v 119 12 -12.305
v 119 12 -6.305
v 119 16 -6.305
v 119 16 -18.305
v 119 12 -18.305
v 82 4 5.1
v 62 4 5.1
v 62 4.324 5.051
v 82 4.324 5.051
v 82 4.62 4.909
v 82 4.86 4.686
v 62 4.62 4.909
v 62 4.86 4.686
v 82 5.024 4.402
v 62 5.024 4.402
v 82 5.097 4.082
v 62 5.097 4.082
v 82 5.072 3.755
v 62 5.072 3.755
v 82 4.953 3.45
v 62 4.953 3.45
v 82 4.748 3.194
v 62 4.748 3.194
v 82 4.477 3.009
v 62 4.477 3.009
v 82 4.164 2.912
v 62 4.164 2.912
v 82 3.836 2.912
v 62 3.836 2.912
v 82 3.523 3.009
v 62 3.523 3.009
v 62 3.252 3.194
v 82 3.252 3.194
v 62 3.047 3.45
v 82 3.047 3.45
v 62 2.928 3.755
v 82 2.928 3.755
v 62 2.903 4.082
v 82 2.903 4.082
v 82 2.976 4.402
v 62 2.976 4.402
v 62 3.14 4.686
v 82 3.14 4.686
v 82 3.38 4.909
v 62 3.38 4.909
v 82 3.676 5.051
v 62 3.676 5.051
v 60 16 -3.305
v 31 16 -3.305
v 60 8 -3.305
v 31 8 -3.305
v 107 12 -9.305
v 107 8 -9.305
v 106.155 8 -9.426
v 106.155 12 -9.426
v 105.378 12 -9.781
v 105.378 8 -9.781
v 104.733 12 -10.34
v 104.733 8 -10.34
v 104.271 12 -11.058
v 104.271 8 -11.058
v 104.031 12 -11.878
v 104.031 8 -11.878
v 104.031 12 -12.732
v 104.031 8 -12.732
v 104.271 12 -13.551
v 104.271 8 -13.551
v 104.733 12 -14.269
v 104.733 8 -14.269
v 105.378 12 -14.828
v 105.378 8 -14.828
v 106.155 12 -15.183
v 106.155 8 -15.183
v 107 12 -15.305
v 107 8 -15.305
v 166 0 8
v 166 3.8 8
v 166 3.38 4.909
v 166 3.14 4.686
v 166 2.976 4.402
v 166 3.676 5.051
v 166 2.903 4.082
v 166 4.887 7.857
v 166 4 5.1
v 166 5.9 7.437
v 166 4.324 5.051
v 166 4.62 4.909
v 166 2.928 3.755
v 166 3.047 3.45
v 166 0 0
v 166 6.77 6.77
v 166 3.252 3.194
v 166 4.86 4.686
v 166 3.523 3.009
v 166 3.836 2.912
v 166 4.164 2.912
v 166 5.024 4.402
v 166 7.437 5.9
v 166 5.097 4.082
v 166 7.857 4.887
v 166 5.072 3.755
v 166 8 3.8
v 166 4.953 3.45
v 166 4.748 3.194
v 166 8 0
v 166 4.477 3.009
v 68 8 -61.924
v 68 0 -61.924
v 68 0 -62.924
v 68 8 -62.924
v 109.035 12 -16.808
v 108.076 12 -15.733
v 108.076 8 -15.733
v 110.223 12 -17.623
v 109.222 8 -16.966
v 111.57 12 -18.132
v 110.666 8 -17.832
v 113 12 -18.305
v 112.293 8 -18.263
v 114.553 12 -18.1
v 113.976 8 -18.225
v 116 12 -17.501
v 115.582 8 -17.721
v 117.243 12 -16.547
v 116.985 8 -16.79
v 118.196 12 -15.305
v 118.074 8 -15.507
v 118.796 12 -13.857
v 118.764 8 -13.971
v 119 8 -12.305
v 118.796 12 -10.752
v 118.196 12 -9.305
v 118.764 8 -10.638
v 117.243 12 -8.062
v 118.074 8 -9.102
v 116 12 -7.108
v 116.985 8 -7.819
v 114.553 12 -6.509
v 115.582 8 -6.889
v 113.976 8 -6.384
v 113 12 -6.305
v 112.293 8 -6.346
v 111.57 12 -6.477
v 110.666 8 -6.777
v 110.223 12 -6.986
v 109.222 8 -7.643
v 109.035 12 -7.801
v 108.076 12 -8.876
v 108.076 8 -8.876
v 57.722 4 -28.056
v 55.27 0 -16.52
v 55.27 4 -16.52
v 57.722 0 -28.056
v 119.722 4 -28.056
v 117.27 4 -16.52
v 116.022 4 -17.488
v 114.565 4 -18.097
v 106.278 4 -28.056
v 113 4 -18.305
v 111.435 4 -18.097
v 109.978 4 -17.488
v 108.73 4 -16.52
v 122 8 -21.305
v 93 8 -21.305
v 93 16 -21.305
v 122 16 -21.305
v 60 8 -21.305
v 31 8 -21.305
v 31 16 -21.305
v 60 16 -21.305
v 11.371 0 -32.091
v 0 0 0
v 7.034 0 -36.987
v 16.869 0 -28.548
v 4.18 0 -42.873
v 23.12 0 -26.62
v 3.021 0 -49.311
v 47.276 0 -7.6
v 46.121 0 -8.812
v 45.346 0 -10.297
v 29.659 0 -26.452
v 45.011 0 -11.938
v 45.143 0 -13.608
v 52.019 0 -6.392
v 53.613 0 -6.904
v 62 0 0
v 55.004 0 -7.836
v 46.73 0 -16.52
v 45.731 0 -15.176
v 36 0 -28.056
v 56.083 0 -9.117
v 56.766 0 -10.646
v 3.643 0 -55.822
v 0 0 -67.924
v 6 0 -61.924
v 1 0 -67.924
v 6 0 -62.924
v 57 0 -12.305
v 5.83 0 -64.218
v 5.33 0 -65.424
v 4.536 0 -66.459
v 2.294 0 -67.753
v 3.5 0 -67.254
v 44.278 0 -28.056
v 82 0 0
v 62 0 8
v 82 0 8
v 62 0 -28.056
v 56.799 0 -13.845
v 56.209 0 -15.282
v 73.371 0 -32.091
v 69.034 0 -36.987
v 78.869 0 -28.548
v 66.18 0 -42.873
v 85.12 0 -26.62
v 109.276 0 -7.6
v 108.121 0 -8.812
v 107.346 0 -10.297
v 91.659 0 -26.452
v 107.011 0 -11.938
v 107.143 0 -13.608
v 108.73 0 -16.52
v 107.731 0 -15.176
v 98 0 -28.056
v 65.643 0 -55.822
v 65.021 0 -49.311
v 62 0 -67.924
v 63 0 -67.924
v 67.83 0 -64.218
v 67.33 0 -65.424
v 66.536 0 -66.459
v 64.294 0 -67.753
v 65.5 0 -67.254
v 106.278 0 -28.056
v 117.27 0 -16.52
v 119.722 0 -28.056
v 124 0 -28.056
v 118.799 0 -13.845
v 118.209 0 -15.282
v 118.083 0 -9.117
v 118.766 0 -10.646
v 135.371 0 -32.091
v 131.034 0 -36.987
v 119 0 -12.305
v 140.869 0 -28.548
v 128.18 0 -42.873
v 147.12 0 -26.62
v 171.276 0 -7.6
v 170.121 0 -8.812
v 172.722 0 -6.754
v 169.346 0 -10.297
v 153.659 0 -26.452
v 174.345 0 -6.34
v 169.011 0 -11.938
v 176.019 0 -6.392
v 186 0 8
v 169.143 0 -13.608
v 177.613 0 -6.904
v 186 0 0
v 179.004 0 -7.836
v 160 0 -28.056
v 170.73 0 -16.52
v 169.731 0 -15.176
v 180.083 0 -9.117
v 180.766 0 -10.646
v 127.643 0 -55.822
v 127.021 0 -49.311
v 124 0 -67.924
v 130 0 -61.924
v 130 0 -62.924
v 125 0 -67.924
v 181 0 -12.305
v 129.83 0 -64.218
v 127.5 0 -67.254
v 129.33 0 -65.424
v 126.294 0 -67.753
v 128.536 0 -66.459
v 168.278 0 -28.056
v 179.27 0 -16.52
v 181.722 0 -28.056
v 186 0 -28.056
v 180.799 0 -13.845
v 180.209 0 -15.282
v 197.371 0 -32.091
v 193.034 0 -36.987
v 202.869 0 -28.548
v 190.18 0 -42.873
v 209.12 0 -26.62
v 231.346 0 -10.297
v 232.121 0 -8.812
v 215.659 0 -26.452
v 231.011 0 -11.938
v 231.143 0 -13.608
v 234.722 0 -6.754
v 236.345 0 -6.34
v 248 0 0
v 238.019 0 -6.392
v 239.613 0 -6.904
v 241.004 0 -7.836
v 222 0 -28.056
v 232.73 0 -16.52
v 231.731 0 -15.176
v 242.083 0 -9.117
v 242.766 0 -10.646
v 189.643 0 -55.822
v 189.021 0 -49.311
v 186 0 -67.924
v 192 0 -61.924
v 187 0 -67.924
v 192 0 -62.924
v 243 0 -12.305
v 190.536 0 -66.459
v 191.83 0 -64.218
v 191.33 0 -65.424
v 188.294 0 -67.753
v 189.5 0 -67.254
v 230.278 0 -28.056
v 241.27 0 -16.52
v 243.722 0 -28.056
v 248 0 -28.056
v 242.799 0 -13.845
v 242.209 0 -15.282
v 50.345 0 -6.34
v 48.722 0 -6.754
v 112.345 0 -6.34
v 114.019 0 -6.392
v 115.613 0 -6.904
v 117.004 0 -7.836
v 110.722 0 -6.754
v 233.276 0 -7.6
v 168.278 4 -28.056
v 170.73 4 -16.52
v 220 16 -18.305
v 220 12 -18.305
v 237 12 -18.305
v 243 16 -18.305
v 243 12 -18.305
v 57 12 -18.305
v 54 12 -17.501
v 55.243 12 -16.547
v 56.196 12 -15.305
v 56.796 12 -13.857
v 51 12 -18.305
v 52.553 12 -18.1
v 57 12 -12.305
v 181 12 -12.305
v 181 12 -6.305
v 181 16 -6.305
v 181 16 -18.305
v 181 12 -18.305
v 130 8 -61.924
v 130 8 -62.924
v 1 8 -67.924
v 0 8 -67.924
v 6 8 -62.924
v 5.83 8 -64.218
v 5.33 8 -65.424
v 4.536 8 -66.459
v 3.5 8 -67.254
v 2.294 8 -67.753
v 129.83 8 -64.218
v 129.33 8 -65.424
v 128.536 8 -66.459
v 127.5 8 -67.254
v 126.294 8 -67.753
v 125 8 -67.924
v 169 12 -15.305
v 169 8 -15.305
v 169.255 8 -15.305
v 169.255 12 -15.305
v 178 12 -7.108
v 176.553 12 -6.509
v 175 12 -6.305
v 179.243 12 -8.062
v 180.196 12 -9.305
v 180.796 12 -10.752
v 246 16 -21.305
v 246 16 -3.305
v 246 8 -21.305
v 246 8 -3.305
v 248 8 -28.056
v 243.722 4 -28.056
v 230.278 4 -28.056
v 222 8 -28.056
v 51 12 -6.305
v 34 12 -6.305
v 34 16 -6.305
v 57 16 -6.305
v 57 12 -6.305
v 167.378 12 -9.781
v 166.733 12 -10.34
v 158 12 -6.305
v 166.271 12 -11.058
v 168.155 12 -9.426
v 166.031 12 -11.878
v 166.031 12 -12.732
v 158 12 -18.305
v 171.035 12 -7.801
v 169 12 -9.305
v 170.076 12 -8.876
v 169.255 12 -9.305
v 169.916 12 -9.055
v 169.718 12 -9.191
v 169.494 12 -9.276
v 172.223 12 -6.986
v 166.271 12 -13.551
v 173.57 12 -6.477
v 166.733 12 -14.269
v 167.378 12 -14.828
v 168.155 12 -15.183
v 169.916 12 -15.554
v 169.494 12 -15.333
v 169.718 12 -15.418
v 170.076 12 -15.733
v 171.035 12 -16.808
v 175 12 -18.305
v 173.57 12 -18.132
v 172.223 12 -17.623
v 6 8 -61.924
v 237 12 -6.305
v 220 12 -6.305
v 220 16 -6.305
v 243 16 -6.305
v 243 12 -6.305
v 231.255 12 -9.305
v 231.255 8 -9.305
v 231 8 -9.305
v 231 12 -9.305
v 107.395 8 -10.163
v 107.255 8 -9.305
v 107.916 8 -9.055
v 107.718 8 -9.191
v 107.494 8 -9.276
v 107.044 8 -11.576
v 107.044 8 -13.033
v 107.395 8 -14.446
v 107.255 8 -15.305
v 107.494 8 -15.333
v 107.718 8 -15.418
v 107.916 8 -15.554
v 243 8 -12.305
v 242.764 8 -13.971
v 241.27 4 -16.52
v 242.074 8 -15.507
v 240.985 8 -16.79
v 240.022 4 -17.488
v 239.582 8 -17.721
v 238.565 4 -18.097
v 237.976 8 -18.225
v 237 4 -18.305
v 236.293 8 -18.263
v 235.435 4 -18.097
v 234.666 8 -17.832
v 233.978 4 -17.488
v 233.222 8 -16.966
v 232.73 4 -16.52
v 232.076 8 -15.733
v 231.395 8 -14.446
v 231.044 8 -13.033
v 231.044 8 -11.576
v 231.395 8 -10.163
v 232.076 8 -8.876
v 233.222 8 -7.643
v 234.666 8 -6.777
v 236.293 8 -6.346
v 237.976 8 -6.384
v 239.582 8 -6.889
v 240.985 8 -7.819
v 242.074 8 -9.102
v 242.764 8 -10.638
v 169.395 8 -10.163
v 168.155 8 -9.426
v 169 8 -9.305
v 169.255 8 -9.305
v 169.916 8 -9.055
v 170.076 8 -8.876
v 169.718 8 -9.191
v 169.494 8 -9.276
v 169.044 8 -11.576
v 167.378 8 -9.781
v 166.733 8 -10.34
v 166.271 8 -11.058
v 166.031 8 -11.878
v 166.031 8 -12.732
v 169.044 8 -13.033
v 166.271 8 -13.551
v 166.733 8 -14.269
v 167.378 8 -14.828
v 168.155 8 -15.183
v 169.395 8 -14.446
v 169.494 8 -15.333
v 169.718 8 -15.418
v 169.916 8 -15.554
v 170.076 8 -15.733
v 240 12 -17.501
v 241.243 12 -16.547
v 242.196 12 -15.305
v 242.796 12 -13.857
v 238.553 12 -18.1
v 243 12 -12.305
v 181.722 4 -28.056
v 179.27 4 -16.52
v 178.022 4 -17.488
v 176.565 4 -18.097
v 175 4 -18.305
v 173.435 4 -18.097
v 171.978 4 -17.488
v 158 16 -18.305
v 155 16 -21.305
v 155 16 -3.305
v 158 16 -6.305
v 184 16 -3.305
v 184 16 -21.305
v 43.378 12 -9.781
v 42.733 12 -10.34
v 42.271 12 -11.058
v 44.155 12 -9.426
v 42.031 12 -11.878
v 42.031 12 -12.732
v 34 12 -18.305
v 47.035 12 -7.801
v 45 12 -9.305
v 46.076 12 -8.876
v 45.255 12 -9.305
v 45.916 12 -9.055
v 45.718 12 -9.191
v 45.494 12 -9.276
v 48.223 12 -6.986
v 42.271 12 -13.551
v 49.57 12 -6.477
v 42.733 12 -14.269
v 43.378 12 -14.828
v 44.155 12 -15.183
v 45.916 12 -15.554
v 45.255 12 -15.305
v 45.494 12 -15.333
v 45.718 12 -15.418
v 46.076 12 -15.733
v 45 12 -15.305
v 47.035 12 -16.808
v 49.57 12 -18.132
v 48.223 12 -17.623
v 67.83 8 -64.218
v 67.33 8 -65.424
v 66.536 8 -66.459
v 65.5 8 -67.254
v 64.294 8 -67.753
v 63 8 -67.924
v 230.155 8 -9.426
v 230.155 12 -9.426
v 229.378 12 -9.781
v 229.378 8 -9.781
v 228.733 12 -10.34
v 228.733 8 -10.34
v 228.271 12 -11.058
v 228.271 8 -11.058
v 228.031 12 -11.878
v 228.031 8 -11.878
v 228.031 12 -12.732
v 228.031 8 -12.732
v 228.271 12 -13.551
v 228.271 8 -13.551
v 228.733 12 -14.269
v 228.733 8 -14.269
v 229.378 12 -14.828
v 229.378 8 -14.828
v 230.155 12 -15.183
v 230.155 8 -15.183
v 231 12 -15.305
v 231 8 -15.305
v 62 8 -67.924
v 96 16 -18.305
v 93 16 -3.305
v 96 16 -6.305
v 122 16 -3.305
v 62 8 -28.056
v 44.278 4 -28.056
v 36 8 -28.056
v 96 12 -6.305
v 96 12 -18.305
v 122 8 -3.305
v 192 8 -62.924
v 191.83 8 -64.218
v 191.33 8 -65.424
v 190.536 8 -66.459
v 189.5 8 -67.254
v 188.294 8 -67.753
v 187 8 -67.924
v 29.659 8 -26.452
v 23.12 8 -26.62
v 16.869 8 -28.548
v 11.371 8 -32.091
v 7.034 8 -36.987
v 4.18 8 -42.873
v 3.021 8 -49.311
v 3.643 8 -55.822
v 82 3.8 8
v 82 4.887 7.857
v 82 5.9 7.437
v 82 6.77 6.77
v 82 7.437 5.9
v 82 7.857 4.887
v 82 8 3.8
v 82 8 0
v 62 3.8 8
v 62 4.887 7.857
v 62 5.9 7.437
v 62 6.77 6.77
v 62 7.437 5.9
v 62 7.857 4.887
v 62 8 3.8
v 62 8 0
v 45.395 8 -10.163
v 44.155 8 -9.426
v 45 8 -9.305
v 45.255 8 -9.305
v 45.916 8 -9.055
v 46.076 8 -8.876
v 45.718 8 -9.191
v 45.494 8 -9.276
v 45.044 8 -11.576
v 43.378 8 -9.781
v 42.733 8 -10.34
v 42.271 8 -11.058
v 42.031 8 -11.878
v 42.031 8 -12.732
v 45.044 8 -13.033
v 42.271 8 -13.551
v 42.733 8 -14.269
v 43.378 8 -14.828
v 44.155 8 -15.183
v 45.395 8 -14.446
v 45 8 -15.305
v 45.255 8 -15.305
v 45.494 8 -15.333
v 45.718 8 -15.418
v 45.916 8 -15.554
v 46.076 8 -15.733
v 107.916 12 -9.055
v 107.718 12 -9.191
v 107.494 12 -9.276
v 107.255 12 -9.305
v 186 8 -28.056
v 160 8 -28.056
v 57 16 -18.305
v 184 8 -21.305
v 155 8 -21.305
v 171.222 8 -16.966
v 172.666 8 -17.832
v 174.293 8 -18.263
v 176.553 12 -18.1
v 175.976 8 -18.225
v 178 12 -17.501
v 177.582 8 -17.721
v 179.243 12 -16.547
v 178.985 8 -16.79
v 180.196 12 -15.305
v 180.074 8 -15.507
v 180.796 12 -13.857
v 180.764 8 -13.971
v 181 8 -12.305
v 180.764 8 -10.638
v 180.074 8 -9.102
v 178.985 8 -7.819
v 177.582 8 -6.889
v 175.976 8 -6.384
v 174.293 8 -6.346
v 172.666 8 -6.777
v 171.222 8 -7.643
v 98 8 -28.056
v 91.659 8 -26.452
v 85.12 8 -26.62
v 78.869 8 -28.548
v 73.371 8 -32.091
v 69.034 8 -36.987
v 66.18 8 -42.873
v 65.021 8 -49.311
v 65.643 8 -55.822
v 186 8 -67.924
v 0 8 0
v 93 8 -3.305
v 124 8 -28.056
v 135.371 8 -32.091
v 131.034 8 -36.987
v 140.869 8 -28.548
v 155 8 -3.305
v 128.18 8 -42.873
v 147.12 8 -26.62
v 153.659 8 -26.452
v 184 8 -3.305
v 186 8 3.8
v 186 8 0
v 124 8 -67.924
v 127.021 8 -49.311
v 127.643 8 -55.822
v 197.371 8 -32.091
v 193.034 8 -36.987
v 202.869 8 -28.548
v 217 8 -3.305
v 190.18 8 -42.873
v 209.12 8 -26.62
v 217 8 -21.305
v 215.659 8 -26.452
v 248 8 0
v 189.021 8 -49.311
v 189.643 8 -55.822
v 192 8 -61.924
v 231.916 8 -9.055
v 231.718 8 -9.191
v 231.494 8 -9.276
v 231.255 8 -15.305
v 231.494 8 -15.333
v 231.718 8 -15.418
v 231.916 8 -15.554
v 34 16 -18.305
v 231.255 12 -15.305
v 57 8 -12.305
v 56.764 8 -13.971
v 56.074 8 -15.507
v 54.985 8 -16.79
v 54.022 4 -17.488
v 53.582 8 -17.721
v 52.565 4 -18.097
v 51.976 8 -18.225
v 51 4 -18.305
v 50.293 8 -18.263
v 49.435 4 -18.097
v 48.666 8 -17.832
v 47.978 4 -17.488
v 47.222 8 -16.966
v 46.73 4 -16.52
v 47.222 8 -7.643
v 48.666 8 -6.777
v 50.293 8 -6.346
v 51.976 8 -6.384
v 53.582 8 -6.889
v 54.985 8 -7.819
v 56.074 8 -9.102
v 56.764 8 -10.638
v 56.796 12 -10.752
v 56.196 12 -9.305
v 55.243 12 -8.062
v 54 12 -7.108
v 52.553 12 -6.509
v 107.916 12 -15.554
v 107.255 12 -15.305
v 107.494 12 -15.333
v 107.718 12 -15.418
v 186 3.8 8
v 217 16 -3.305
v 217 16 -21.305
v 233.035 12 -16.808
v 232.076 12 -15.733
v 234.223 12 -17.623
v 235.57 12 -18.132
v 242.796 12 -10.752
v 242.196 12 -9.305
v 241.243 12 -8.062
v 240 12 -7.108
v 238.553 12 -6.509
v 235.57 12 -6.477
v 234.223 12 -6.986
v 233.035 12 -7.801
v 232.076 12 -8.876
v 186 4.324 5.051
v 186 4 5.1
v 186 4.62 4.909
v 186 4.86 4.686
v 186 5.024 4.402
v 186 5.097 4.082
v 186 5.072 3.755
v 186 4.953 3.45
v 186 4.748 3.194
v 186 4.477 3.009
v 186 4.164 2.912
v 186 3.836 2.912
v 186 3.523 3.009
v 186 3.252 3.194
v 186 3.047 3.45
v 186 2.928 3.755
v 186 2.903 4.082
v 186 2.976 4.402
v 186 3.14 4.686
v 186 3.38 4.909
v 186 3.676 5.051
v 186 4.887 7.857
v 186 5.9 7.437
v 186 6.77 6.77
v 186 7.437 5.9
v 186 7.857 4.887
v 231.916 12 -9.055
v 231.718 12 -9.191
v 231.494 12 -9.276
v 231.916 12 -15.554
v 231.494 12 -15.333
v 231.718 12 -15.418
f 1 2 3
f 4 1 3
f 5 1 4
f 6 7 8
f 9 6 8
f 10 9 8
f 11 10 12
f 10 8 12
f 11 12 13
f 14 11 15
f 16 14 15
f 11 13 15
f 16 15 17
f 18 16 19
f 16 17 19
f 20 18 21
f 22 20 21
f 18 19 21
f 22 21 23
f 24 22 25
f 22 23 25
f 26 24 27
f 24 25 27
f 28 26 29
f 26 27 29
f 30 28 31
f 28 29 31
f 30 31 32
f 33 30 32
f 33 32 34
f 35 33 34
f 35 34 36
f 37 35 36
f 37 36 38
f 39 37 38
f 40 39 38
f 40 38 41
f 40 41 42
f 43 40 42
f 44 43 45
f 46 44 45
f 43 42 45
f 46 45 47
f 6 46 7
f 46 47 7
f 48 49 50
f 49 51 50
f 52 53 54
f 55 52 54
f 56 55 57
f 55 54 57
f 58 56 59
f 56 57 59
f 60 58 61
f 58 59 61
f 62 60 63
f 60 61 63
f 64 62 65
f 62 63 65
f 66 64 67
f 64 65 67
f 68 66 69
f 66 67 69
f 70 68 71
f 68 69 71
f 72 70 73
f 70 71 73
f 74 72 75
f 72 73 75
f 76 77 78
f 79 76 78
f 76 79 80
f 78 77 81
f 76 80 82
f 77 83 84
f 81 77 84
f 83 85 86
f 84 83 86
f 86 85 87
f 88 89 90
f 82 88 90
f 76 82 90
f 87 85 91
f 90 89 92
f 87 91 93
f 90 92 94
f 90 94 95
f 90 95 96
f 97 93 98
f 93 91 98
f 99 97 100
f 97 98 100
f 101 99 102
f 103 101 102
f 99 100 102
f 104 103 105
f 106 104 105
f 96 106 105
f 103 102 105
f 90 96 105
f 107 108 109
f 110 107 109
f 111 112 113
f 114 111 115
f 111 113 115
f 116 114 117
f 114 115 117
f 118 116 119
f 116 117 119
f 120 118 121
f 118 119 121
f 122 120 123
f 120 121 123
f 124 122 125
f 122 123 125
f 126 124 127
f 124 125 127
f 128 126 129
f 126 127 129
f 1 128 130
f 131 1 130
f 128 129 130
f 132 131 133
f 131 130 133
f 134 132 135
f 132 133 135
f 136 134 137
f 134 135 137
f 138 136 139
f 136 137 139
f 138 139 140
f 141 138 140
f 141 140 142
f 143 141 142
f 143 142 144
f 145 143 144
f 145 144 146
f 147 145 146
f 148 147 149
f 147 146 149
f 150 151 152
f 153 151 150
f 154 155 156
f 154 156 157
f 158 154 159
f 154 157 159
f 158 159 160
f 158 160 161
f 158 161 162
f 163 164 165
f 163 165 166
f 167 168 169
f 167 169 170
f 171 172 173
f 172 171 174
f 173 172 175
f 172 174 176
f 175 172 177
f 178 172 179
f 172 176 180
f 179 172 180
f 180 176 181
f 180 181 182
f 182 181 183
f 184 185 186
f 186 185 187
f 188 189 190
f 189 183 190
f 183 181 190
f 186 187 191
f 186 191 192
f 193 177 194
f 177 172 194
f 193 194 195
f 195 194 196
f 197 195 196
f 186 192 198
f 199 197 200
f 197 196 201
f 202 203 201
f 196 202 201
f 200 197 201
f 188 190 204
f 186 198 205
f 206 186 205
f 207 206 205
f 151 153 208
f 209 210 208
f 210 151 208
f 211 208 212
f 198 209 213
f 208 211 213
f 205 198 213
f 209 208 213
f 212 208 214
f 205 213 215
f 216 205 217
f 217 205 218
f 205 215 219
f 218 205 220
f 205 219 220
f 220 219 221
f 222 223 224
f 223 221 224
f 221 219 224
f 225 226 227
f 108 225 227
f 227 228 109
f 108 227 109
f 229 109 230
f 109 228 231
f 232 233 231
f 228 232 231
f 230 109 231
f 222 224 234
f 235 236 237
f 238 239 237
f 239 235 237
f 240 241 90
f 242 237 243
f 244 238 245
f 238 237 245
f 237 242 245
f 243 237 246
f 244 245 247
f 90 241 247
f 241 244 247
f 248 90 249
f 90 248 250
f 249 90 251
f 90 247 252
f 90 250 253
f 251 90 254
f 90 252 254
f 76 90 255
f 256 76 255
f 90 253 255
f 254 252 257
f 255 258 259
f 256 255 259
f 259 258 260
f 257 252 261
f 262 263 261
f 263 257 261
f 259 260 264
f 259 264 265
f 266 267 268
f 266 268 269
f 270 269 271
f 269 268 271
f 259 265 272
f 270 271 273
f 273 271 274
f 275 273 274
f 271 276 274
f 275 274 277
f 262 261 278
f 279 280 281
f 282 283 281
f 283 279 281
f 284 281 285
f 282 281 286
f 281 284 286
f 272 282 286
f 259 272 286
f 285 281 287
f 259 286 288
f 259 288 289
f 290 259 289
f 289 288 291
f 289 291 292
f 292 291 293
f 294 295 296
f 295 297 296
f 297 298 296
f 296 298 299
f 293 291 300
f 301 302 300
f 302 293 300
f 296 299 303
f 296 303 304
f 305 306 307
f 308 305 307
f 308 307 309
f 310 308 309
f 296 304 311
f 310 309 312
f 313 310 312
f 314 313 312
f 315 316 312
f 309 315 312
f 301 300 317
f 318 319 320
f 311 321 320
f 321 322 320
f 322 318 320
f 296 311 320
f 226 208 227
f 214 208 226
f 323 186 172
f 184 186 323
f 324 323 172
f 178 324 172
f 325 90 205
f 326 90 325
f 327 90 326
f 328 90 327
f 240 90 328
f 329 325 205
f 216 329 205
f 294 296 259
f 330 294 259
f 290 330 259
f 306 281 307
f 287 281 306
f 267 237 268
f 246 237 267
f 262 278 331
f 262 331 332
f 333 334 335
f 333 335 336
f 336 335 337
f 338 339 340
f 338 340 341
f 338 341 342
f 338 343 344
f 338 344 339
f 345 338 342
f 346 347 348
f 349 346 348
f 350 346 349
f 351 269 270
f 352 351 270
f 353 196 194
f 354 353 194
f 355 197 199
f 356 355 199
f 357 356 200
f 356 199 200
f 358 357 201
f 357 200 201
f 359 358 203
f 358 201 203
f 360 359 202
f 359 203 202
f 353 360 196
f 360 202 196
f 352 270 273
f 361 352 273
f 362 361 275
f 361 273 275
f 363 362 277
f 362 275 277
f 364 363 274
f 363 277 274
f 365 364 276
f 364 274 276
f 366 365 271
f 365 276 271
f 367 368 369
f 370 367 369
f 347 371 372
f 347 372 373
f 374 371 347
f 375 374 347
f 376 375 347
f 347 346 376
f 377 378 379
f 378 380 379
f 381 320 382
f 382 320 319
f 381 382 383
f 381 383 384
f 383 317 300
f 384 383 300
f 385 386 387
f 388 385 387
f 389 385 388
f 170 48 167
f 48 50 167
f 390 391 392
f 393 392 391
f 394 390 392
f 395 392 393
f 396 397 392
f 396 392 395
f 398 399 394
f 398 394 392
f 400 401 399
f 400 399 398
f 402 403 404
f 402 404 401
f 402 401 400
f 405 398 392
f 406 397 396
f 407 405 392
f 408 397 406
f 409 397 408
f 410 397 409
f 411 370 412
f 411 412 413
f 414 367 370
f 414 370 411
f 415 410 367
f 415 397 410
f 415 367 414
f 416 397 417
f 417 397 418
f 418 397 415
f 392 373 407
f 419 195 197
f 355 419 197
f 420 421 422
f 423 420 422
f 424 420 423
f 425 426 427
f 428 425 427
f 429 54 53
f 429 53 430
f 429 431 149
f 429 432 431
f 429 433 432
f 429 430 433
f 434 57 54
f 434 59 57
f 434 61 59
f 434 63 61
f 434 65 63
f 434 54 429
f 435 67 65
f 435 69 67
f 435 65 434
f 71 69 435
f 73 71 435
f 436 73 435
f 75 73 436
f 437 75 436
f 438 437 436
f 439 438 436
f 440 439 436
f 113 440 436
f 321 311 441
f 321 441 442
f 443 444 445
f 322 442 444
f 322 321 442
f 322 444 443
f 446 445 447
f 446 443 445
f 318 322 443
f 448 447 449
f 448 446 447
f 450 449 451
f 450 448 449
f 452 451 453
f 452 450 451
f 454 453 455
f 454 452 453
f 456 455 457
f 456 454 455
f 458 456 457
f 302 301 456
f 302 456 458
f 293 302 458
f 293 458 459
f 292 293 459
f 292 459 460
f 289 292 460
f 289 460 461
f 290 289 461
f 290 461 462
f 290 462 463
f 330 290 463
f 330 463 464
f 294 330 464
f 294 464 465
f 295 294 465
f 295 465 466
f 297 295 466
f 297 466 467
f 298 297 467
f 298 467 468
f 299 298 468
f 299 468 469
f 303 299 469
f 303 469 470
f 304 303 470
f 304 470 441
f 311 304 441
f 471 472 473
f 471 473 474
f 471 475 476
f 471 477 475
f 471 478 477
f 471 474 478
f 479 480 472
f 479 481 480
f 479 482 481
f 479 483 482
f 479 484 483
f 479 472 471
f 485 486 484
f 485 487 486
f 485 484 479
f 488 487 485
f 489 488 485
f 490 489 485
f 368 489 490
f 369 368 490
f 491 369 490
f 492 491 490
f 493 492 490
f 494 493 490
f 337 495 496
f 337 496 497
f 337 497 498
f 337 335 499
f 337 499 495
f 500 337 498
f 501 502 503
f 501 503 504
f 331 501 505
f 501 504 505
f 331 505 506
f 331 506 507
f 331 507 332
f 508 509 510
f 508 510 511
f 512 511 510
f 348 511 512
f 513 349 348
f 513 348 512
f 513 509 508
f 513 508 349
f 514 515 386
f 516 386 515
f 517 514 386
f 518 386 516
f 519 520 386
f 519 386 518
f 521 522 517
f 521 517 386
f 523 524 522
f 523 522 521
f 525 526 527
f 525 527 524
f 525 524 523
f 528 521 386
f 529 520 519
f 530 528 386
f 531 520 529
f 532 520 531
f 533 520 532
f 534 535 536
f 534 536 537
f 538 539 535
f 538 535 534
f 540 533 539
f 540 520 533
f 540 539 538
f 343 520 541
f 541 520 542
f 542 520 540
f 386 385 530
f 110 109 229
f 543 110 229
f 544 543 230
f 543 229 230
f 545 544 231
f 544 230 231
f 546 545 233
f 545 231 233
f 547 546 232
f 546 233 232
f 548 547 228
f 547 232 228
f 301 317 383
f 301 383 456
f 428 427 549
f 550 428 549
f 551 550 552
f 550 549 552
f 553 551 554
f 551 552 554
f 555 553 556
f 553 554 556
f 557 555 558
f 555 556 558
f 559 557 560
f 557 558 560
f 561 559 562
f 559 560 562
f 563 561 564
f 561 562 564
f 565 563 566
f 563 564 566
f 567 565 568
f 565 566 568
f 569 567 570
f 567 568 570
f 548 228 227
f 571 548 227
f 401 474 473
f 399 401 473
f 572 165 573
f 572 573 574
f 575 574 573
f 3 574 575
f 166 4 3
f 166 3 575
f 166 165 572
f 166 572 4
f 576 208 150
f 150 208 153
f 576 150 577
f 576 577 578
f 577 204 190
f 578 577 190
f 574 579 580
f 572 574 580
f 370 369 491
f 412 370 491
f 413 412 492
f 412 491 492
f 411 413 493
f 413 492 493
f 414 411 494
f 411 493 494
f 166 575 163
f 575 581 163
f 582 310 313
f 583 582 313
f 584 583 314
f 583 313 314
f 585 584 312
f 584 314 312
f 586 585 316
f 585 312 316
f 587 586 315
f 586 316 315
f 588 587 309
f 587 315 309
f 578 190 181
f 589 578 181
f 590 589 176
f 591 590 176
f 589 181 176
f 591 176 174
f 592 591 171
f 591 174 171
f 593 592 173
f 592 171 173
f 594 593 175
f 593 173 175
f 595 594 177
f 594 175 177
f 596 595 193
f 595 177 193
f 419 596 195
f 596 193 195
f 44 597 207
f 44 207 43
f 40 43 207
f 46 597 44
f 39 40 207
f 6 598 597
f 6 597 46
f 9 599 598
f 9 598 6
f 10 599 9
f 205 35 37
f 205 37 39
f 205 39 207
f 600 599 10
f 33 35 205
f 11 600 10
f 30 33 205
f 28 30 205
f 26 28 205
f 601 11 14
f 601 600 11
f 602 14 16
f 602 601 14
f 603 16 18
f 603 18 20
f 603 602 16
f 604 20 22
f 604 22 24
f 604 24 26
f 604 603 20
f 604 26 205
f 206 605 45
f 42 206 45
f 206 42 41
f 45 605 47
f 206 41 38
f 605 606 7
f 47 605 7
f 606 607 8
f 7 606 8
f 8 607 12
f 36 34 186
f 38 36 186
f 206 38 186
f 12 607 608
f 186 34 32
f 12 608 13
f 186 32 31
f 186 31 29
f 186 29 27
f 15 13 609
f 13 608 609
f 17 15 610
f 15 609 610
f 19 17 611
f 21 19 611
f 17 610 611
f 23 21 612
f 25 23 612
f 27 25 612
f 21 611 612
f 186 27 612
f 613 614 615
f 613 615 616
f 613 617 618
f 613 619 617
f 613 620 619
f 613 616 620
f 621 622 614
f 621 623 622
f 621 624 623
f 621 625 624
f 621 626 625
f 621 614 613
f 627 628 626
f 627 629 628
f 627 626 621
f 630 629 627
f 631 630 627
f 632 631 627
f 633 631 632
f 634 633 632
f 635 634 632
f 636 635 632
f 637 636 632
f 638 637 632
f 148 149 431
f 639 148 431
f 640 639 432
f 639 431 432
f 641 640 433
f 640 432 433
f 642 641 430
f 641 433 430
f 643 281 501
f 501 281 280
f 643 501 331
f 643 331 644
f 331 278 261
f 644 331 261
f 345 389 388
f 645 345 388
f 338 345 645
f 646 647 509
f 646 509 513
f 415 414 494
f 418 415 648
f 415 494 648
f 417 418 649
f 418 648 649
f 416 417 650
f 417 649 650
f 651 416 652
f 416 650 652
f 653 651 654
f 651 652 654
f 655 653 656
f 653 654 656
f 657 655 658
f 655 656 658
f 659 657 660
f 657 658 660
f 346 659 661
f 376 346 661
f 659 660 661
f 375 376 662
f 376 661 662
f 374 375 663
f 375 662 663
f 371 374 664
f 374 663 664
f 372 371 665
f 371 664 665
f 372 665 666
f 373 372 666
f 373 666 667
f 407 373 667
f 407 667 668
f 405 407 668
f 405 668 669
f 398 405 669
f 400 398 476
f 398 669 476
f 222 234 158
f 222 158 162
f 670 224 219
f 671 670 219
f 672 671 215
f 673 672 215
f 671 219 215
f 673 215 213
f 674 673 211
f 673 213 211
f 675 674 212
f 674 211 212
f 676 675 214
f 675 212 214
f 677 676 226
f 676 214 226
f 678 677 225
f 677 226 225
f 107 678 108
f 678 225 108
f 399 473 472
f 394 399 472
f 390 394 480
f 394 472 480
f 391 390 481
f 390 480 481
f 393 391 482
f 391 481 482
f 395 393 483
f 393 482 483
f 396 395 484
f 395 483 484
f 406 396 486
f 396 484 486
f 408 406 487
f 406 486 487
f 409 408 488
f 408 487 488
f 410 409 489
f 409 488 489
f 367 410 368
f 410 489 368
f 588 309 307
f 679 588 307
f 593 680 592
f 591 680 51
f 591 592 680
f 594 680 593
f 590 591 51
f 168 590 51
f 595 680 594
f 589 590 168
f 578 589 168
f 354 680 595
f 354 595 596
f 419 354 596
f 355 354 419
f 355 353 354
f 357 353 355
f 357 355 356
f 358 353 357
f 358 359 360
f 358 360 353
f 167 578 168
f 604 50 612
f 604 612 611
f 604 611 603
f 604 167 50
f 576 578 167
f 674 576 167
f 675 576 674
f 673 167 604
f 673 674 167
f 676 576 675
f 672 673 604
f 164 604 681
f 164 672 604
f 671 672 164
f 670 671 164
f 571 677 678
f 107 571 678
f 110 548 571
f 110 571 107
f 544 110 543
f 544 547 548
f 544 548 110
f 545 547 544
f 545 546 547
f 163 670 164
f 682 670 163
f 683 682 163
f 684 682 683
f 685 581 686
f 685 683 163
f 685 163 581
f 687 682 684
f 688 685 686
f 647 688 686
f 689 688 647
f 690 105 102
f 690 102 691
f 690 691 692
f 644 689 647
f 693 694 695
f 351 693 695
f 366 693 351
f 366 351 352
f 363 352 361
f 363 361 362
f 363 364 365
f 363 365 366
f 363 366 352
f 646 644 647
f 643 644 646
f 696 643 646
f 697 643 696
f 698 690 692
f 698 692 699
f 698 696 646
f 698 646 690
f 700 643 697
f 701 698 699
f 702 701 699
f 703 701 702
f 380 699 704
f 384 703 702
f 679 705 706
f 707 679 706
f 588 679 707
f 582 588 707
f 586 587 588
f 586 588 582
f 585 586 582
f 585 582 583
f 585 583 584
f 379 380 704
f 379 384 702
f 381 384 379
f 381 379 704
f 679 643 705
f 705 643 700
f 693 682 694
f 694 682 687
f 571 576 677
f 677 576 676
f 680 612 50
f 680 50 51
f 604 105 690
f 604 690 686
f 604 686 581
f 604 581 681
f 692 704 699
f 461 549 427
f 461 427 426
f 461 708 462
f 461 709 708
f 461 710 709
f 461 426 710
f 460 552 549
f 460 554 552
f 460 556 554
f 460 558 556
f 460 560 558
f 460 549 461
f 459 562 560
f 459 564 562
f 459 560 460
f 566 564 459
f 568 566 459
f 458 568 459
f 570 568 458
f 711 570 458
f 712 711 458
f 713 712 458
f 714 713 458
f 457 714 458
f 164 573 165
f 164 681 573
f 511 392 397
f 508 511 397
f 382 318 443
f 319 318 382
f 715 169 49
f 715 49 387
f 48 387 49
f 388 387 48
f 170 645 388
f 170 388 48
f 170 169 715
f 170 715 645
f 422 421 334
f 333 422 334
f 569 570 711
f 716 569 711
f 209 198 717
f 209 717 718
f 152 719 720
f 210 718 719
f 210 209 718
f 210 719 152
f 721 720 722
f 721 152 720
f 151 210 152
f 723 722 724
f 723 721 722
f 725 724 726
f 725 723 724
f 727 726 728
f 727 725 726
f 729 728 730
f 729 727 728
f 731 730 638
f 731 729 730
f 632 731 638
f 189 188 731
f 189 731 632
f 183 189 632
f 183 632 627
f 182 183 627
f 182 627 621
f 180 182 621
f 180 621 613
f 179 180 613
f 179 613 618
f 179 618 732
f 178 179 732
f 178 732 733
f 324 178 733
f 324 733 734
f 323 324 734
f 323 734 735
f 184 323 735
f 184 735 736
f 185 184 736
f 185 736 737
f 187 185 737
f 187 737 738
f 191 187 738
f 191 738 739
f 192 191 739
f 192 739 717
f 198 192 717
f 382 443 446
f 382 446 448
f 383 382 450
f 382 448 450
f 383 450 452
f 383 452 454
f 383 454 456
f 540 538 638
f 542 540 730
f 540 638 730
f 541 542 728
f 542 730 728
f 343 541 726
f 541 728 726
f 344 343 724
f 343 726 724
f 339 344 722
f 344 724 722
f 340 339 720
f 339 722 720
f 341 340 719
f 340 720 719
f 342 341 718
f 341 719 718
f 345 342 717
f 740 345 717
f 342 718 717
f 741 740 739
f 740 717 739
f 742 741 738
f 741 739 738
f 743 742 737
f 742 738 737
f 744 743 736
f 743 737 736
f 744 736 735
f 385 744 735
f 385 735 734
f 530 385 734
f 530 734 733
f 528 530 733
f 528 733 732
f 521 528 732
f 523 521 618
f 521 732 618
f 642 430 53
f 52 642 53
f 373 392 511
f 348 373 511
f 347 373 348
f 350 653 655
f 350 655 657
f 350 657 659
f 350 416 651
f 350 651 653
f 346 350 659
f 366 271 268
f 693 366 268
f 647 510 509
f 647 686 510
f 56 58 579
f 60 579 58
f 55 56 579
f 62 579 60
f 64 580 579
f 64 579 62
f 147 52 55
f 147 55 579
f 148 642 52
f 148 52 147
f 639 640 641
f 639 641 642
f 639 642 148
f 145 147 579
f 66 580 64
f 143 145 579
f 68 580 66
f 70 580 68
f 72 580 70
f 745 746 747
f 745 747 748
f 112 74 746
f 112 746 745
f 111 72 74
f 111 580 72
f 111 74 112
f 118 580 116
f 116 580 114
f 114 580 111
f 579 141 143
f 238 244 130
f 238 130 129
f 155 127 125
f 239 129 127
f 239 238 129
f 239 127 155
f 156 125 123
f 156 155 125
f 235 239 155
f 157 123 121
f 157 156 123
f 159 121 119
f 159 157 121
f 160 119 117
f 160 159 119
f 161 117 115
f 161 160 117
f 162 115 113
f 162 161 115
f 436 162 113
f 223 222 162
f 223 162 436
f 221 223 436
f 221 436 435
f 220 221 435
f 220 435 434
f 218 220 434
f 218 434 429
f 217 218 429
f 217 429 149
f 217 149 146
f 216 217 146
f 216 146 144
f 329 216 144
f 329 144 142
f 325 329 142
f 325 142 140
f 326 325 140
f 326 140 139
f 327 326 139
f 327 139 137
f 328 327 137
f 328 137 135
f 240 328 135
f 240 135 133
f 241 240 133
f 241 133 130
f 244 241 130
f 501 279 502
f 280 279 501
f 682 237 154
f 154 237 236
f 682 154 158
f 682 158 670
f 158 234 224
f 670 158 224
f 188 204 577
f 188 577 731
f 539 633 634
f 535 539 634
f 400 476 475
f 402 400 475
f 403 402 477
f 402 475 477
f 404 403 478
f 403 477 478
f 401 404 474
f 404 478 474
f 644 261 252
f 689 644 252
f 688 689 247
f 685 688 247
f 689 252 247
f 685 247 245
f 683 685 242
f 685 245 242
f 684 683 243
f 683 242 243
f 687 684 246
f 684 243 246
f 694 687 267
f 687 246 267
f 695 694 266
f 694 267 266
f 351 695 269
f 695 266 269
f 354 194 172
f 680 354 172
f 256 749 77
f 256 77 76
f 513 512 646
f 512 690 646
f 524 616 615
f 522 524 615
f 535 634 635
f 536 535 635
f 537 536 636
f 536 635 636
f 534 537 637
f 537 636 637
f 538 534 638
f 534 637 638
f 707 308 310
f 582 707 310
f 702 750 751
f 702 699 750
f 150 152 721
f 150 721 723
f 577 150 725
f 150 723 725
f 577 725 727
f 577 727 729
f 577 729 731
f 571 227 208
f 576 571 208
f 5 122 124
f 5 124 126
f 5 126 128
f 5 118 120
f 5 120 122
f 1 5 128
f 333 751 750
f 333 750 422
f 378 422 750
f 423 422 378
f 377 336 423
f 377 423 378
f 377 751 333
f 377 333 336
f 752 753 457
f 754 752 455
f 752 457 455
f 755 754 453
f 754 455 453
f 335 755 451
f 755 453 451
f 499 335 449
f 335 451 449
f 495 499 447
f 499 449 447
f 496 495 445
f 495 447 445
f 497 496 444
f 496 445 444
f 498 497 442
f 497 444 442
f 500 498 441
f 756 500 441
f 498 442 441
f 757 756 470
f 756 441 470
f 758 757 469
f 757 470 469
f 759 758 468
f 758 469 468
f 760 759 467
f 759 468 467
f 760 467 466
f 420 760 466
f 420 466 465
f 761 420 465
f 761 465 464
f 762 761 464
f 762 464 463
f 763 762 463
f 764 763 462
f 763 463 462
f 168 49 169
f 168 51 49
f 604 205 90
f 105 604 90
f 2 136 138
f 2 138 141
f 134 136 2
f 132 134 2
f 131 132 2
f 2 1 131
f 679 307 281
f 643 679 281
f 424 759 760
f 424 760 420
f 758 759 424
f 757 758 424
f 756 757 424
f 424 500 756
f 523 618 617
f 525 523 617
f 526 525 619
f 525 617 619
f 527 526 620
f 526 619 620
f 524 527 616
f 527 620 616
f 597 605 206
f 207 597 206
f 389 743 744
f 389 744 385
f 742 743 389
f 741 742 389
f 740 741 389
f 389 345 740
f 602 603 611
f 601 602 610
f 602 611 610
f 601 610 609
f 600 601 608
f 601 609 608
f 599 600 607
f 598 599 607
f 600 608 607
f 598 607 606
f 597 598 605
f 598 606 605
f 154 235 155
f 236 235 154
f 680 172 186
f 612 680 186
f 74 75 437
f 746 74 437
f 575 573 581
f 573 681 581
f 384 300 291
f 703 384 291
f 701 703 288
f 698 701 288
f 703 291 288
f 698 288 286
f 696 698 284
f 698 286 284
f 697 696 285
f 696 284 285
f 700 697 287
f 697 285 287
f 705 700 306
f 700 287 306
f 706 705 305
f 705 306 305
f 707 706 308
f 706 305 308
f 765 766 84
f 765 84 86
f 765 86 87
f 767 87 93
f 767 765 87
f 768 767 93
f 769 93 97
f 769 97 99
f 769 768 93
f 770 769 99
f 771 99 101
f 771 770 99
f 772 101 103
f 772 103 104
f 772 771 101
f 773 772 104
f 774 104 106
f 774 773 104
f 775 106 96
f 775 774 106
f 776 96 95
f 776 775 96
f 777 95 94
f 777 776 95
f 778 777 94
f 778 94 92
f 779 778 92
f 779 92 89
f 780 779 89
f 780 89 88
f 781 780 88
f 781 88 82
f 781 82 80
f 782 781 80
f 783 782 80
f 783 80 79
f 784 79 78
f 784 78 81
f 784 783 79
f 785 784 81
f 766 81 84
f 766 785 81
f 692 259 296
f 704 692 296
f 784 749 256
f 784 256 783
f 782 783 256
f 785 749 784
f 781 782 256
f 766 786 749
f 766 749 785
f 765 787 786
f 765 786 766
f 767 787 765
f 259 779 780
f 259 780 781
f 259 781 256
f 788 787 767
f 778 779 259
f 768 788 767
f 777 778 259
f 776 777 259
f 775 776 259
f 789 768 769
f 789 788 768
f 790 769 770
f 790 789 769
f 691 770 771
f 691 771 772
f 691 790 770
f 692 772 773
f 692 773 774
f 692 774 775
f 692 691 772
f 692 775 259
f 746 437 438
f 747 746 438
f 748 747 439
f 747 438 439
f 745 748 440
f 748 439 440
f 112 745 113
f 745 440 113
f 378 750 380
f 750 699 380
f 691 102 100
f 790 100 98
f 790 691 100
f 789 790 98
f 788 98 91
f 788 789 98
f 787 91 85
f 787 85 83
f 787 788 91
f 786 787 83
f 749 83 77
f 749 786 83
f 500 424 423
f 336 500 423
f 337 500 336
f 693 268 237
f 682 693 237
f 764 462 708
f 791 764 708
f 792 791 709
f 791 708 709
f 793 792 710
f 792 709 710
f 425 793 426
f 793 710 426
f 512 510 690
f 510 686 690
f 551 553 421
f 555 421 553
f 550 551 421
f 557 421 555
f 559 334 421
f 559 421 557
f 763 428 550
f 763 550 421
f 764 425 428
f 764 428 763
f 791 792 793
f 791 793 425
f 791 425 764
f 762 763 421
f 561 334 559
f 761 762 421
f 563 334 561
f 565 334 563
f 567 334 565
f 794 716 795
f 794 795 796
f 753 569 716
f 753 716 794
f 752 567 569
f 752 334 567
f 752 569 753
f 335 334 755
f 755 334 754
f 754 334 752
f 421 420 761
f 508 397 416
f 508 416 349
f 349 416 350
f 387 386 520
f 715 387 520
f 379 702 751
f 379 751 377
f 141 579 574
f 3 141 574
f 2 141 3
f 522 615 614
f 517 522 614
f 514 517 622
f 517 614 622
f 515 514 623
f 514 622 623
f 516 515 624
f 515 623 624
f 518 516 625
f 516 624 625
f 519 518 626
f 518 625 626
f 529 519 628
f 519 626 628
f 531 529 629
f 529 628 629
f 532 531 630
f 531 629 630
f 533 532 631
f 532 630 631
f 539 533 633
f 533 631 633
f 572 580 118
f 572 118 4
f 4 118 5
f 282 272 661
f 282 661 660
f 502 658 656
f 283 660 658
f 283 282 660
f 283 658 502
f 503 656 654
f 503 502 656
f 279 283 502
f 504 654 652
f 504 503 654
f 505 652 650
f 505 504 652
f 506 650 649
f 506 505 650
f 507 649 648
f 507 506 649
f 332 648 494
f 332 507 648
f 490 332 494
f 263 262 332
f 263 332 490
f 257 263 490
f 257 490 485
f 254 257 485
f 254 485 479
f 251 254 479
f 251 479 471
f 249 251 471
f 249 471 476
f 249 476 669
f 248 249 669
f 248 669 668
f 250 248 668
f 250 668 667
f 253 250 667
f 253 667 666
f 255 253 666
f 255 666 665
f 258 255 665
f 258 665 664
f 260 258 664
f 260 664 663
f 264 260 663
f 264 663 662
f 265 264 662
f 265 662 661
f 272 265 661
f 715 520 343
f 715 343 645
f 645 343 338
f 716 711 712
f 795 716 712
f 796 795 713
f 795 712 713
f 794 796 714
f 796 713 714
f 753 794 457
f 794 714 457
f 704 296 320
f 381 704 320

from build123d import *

# Parameters (mm, degrees)
ESQUISSE1_R                = 6
BOSS_EXTRU_1_DEPTH         = 8
ESQUISSE2_W                = 29
ESQUISSE2_H                = 18
BOSS_EXTRU_2_DEPTH         = 4
ESQUISSE3_W                = 29
ESQUISSE3_H                = 18
ESQUISSE3_W_2              = 23
ESQUISSE3_H_2              = 12
BOSS_EXTRU_3_DEPTH         = 4
ENL_V_MAT_EXTRU_1_DEPTH    = 4
R_P_TITION_LIN_AIRE1_COUNT = 4
R_P_TITION_LIN_AIRE1_PITCH = 62
ESQUISSE5_R                = 1.1
BOSS_EXTRU_4_DEPTH         = 20


with BuildPart() as part:
    # Esquisse1 → Boss.-Extru.1 (new body)
    with BuildSketch(Plane(origin=(0, 0, 0), x_dir=(1, 0, 0), z_dir=(0, 1, 0))):
        with BuildLine():
            Line((0, 0), (6, 0))
            Line((6, 0), (36, 0))
            Line((36, 0), (62, 0))
            Line((62, 0), (62, 28.055987731))
            Line((62, 28.055987731), (36, 28.055987731))
            ThreePointArc((36, 28.055987731), (9.034681758, 34.39083629), (6, 61.923533231))
            Line((6, 61.923533231), (6, 62.923533231))
            ThreePointArc((6, 62.923533231), (4.535533906, 66.459067137), (1, 67.923533231))
            Line((1, 67.923533231), (0, 67.923533231))
            Line((0, 67.923533231), (0, 0))
        make_face()
        with Locations((51, 12.304583192)):
            Circle(ESQUISSE1_R, mode=Mode.SUBTRACT)
    extrude(amount=BOSS_EXTRU_1_DEPTH)

    # Esquisse2 → Boss.-Extru.2 (add)
    with BuildSketch(Plane(origin=(0, 8, 0), x_dir=(1, 0, 0), z_dir=(0, 1, 0))):
        with Locations((45.5, 12.304583192)):
            Rectangle(ESQUISSE2_W, ESQUISSE2_H)
        with BuildLine():
            Line((45, 15.304583192), (45.255437353, 15.304583192))
            ThreePointArc((45.255437353, 15.304583192), (45.718347403, 15.418177932), (46.07608916, 15.733154621))
            ThreePointArc((46.07608916, 15.733154621), (57, 12.304583192), (46.07608916, 8.876011764))
            ThreePointArc((46.07608916, 8.876011764), (45.718347403, 9.190988453), (45.255437353, 9.304583192))
            Line((45.255437353, 9.304583192), (45, 9.304583192))
            ThreePointArc((45, 9.304583192), (42, 12.304583192), (45, 15.304583192))
        make_face(mode=Mode.SUBTRACT)
    extrude(amount=BOSS_EXTRU_2_DEPTH)

    # Esquisse3 → Boss.-Extru.3 (add)
    with BuildSketch(Plane(origin=(0, 12, 0), x_dir=(1, 0, 0), z_dir=(0, 1, 0))):
        with Locations((45.5, 12.304583192)):
            Rectangle(ESQUISSE3_W, ESQUISSE3_H)
        with Locations((45.5, 12.304583192)):
            Rectangle(ESQUISSE3_W_2, ESQUISSE3_H_2, mode=Mode.SUBTRACT)
    extrude(amount=BOSS_EXTRU_3_DEPTH)

    # Esquisse4 → Enlèv. mat.-Extru.1 (cut)
    with BuildSketch(Plane.XZ):
        Polygon((47.7, -17.055987731), (54.3, -17.055987731), (55.193703609, -16.162284122), (57.721788353, -28.055987731), (54.3, -28.055987731), (47.7, -28.055987731), (44.278211647, -28.055987731), (46.806296391, -16.162284122), align=None)
    extrude(amount=-ENL_V_MAT_EXTRU_1_DEPTH, mode=Mode.SUBTRACT)

    # Répétition linéaire1: part ×4


with BuildPart() as part_1:
    add(part.part)
    with Locations(*[(i * R_P_TITION_LIN_AIRE1_PITCH, 0, 0) for i in range(1, R_P_TITION_LIN_AIRE1_COUNT)]):
        add(part.part)

    # Esquisse5 → Boss.-Extru.4 (add)
    with BuildSketch(Plane.ZY.offset(-62)):
        with BuildLine():
            Line((0, 8), (3.8, 8))
            ThreePointArc((3.8, 8), (6.769848481, 6.769848481), (8, 3.8))
            Line((8, 3.8), (8, 0))
            Line((8, 0), (0, 0))
            Line((0, 0), (0, 8))
        make_face()
        with Locations((4, 4)):
            Circle(ESQUISSE5_R, mode=Mode.SUBTRACT)
    boss_extru_4 = extrude(amount=-BOSS_EXTRU_4_DEPTH)

    # Symétrie1: Boss.-Extru.4 across plane
    add(boss_extru_4.mirror(Plane(origin=(124, 8, 0), x_dir=(0, 0, 1), z_dir=(1, 0, 0))))


solid = part_1.part
